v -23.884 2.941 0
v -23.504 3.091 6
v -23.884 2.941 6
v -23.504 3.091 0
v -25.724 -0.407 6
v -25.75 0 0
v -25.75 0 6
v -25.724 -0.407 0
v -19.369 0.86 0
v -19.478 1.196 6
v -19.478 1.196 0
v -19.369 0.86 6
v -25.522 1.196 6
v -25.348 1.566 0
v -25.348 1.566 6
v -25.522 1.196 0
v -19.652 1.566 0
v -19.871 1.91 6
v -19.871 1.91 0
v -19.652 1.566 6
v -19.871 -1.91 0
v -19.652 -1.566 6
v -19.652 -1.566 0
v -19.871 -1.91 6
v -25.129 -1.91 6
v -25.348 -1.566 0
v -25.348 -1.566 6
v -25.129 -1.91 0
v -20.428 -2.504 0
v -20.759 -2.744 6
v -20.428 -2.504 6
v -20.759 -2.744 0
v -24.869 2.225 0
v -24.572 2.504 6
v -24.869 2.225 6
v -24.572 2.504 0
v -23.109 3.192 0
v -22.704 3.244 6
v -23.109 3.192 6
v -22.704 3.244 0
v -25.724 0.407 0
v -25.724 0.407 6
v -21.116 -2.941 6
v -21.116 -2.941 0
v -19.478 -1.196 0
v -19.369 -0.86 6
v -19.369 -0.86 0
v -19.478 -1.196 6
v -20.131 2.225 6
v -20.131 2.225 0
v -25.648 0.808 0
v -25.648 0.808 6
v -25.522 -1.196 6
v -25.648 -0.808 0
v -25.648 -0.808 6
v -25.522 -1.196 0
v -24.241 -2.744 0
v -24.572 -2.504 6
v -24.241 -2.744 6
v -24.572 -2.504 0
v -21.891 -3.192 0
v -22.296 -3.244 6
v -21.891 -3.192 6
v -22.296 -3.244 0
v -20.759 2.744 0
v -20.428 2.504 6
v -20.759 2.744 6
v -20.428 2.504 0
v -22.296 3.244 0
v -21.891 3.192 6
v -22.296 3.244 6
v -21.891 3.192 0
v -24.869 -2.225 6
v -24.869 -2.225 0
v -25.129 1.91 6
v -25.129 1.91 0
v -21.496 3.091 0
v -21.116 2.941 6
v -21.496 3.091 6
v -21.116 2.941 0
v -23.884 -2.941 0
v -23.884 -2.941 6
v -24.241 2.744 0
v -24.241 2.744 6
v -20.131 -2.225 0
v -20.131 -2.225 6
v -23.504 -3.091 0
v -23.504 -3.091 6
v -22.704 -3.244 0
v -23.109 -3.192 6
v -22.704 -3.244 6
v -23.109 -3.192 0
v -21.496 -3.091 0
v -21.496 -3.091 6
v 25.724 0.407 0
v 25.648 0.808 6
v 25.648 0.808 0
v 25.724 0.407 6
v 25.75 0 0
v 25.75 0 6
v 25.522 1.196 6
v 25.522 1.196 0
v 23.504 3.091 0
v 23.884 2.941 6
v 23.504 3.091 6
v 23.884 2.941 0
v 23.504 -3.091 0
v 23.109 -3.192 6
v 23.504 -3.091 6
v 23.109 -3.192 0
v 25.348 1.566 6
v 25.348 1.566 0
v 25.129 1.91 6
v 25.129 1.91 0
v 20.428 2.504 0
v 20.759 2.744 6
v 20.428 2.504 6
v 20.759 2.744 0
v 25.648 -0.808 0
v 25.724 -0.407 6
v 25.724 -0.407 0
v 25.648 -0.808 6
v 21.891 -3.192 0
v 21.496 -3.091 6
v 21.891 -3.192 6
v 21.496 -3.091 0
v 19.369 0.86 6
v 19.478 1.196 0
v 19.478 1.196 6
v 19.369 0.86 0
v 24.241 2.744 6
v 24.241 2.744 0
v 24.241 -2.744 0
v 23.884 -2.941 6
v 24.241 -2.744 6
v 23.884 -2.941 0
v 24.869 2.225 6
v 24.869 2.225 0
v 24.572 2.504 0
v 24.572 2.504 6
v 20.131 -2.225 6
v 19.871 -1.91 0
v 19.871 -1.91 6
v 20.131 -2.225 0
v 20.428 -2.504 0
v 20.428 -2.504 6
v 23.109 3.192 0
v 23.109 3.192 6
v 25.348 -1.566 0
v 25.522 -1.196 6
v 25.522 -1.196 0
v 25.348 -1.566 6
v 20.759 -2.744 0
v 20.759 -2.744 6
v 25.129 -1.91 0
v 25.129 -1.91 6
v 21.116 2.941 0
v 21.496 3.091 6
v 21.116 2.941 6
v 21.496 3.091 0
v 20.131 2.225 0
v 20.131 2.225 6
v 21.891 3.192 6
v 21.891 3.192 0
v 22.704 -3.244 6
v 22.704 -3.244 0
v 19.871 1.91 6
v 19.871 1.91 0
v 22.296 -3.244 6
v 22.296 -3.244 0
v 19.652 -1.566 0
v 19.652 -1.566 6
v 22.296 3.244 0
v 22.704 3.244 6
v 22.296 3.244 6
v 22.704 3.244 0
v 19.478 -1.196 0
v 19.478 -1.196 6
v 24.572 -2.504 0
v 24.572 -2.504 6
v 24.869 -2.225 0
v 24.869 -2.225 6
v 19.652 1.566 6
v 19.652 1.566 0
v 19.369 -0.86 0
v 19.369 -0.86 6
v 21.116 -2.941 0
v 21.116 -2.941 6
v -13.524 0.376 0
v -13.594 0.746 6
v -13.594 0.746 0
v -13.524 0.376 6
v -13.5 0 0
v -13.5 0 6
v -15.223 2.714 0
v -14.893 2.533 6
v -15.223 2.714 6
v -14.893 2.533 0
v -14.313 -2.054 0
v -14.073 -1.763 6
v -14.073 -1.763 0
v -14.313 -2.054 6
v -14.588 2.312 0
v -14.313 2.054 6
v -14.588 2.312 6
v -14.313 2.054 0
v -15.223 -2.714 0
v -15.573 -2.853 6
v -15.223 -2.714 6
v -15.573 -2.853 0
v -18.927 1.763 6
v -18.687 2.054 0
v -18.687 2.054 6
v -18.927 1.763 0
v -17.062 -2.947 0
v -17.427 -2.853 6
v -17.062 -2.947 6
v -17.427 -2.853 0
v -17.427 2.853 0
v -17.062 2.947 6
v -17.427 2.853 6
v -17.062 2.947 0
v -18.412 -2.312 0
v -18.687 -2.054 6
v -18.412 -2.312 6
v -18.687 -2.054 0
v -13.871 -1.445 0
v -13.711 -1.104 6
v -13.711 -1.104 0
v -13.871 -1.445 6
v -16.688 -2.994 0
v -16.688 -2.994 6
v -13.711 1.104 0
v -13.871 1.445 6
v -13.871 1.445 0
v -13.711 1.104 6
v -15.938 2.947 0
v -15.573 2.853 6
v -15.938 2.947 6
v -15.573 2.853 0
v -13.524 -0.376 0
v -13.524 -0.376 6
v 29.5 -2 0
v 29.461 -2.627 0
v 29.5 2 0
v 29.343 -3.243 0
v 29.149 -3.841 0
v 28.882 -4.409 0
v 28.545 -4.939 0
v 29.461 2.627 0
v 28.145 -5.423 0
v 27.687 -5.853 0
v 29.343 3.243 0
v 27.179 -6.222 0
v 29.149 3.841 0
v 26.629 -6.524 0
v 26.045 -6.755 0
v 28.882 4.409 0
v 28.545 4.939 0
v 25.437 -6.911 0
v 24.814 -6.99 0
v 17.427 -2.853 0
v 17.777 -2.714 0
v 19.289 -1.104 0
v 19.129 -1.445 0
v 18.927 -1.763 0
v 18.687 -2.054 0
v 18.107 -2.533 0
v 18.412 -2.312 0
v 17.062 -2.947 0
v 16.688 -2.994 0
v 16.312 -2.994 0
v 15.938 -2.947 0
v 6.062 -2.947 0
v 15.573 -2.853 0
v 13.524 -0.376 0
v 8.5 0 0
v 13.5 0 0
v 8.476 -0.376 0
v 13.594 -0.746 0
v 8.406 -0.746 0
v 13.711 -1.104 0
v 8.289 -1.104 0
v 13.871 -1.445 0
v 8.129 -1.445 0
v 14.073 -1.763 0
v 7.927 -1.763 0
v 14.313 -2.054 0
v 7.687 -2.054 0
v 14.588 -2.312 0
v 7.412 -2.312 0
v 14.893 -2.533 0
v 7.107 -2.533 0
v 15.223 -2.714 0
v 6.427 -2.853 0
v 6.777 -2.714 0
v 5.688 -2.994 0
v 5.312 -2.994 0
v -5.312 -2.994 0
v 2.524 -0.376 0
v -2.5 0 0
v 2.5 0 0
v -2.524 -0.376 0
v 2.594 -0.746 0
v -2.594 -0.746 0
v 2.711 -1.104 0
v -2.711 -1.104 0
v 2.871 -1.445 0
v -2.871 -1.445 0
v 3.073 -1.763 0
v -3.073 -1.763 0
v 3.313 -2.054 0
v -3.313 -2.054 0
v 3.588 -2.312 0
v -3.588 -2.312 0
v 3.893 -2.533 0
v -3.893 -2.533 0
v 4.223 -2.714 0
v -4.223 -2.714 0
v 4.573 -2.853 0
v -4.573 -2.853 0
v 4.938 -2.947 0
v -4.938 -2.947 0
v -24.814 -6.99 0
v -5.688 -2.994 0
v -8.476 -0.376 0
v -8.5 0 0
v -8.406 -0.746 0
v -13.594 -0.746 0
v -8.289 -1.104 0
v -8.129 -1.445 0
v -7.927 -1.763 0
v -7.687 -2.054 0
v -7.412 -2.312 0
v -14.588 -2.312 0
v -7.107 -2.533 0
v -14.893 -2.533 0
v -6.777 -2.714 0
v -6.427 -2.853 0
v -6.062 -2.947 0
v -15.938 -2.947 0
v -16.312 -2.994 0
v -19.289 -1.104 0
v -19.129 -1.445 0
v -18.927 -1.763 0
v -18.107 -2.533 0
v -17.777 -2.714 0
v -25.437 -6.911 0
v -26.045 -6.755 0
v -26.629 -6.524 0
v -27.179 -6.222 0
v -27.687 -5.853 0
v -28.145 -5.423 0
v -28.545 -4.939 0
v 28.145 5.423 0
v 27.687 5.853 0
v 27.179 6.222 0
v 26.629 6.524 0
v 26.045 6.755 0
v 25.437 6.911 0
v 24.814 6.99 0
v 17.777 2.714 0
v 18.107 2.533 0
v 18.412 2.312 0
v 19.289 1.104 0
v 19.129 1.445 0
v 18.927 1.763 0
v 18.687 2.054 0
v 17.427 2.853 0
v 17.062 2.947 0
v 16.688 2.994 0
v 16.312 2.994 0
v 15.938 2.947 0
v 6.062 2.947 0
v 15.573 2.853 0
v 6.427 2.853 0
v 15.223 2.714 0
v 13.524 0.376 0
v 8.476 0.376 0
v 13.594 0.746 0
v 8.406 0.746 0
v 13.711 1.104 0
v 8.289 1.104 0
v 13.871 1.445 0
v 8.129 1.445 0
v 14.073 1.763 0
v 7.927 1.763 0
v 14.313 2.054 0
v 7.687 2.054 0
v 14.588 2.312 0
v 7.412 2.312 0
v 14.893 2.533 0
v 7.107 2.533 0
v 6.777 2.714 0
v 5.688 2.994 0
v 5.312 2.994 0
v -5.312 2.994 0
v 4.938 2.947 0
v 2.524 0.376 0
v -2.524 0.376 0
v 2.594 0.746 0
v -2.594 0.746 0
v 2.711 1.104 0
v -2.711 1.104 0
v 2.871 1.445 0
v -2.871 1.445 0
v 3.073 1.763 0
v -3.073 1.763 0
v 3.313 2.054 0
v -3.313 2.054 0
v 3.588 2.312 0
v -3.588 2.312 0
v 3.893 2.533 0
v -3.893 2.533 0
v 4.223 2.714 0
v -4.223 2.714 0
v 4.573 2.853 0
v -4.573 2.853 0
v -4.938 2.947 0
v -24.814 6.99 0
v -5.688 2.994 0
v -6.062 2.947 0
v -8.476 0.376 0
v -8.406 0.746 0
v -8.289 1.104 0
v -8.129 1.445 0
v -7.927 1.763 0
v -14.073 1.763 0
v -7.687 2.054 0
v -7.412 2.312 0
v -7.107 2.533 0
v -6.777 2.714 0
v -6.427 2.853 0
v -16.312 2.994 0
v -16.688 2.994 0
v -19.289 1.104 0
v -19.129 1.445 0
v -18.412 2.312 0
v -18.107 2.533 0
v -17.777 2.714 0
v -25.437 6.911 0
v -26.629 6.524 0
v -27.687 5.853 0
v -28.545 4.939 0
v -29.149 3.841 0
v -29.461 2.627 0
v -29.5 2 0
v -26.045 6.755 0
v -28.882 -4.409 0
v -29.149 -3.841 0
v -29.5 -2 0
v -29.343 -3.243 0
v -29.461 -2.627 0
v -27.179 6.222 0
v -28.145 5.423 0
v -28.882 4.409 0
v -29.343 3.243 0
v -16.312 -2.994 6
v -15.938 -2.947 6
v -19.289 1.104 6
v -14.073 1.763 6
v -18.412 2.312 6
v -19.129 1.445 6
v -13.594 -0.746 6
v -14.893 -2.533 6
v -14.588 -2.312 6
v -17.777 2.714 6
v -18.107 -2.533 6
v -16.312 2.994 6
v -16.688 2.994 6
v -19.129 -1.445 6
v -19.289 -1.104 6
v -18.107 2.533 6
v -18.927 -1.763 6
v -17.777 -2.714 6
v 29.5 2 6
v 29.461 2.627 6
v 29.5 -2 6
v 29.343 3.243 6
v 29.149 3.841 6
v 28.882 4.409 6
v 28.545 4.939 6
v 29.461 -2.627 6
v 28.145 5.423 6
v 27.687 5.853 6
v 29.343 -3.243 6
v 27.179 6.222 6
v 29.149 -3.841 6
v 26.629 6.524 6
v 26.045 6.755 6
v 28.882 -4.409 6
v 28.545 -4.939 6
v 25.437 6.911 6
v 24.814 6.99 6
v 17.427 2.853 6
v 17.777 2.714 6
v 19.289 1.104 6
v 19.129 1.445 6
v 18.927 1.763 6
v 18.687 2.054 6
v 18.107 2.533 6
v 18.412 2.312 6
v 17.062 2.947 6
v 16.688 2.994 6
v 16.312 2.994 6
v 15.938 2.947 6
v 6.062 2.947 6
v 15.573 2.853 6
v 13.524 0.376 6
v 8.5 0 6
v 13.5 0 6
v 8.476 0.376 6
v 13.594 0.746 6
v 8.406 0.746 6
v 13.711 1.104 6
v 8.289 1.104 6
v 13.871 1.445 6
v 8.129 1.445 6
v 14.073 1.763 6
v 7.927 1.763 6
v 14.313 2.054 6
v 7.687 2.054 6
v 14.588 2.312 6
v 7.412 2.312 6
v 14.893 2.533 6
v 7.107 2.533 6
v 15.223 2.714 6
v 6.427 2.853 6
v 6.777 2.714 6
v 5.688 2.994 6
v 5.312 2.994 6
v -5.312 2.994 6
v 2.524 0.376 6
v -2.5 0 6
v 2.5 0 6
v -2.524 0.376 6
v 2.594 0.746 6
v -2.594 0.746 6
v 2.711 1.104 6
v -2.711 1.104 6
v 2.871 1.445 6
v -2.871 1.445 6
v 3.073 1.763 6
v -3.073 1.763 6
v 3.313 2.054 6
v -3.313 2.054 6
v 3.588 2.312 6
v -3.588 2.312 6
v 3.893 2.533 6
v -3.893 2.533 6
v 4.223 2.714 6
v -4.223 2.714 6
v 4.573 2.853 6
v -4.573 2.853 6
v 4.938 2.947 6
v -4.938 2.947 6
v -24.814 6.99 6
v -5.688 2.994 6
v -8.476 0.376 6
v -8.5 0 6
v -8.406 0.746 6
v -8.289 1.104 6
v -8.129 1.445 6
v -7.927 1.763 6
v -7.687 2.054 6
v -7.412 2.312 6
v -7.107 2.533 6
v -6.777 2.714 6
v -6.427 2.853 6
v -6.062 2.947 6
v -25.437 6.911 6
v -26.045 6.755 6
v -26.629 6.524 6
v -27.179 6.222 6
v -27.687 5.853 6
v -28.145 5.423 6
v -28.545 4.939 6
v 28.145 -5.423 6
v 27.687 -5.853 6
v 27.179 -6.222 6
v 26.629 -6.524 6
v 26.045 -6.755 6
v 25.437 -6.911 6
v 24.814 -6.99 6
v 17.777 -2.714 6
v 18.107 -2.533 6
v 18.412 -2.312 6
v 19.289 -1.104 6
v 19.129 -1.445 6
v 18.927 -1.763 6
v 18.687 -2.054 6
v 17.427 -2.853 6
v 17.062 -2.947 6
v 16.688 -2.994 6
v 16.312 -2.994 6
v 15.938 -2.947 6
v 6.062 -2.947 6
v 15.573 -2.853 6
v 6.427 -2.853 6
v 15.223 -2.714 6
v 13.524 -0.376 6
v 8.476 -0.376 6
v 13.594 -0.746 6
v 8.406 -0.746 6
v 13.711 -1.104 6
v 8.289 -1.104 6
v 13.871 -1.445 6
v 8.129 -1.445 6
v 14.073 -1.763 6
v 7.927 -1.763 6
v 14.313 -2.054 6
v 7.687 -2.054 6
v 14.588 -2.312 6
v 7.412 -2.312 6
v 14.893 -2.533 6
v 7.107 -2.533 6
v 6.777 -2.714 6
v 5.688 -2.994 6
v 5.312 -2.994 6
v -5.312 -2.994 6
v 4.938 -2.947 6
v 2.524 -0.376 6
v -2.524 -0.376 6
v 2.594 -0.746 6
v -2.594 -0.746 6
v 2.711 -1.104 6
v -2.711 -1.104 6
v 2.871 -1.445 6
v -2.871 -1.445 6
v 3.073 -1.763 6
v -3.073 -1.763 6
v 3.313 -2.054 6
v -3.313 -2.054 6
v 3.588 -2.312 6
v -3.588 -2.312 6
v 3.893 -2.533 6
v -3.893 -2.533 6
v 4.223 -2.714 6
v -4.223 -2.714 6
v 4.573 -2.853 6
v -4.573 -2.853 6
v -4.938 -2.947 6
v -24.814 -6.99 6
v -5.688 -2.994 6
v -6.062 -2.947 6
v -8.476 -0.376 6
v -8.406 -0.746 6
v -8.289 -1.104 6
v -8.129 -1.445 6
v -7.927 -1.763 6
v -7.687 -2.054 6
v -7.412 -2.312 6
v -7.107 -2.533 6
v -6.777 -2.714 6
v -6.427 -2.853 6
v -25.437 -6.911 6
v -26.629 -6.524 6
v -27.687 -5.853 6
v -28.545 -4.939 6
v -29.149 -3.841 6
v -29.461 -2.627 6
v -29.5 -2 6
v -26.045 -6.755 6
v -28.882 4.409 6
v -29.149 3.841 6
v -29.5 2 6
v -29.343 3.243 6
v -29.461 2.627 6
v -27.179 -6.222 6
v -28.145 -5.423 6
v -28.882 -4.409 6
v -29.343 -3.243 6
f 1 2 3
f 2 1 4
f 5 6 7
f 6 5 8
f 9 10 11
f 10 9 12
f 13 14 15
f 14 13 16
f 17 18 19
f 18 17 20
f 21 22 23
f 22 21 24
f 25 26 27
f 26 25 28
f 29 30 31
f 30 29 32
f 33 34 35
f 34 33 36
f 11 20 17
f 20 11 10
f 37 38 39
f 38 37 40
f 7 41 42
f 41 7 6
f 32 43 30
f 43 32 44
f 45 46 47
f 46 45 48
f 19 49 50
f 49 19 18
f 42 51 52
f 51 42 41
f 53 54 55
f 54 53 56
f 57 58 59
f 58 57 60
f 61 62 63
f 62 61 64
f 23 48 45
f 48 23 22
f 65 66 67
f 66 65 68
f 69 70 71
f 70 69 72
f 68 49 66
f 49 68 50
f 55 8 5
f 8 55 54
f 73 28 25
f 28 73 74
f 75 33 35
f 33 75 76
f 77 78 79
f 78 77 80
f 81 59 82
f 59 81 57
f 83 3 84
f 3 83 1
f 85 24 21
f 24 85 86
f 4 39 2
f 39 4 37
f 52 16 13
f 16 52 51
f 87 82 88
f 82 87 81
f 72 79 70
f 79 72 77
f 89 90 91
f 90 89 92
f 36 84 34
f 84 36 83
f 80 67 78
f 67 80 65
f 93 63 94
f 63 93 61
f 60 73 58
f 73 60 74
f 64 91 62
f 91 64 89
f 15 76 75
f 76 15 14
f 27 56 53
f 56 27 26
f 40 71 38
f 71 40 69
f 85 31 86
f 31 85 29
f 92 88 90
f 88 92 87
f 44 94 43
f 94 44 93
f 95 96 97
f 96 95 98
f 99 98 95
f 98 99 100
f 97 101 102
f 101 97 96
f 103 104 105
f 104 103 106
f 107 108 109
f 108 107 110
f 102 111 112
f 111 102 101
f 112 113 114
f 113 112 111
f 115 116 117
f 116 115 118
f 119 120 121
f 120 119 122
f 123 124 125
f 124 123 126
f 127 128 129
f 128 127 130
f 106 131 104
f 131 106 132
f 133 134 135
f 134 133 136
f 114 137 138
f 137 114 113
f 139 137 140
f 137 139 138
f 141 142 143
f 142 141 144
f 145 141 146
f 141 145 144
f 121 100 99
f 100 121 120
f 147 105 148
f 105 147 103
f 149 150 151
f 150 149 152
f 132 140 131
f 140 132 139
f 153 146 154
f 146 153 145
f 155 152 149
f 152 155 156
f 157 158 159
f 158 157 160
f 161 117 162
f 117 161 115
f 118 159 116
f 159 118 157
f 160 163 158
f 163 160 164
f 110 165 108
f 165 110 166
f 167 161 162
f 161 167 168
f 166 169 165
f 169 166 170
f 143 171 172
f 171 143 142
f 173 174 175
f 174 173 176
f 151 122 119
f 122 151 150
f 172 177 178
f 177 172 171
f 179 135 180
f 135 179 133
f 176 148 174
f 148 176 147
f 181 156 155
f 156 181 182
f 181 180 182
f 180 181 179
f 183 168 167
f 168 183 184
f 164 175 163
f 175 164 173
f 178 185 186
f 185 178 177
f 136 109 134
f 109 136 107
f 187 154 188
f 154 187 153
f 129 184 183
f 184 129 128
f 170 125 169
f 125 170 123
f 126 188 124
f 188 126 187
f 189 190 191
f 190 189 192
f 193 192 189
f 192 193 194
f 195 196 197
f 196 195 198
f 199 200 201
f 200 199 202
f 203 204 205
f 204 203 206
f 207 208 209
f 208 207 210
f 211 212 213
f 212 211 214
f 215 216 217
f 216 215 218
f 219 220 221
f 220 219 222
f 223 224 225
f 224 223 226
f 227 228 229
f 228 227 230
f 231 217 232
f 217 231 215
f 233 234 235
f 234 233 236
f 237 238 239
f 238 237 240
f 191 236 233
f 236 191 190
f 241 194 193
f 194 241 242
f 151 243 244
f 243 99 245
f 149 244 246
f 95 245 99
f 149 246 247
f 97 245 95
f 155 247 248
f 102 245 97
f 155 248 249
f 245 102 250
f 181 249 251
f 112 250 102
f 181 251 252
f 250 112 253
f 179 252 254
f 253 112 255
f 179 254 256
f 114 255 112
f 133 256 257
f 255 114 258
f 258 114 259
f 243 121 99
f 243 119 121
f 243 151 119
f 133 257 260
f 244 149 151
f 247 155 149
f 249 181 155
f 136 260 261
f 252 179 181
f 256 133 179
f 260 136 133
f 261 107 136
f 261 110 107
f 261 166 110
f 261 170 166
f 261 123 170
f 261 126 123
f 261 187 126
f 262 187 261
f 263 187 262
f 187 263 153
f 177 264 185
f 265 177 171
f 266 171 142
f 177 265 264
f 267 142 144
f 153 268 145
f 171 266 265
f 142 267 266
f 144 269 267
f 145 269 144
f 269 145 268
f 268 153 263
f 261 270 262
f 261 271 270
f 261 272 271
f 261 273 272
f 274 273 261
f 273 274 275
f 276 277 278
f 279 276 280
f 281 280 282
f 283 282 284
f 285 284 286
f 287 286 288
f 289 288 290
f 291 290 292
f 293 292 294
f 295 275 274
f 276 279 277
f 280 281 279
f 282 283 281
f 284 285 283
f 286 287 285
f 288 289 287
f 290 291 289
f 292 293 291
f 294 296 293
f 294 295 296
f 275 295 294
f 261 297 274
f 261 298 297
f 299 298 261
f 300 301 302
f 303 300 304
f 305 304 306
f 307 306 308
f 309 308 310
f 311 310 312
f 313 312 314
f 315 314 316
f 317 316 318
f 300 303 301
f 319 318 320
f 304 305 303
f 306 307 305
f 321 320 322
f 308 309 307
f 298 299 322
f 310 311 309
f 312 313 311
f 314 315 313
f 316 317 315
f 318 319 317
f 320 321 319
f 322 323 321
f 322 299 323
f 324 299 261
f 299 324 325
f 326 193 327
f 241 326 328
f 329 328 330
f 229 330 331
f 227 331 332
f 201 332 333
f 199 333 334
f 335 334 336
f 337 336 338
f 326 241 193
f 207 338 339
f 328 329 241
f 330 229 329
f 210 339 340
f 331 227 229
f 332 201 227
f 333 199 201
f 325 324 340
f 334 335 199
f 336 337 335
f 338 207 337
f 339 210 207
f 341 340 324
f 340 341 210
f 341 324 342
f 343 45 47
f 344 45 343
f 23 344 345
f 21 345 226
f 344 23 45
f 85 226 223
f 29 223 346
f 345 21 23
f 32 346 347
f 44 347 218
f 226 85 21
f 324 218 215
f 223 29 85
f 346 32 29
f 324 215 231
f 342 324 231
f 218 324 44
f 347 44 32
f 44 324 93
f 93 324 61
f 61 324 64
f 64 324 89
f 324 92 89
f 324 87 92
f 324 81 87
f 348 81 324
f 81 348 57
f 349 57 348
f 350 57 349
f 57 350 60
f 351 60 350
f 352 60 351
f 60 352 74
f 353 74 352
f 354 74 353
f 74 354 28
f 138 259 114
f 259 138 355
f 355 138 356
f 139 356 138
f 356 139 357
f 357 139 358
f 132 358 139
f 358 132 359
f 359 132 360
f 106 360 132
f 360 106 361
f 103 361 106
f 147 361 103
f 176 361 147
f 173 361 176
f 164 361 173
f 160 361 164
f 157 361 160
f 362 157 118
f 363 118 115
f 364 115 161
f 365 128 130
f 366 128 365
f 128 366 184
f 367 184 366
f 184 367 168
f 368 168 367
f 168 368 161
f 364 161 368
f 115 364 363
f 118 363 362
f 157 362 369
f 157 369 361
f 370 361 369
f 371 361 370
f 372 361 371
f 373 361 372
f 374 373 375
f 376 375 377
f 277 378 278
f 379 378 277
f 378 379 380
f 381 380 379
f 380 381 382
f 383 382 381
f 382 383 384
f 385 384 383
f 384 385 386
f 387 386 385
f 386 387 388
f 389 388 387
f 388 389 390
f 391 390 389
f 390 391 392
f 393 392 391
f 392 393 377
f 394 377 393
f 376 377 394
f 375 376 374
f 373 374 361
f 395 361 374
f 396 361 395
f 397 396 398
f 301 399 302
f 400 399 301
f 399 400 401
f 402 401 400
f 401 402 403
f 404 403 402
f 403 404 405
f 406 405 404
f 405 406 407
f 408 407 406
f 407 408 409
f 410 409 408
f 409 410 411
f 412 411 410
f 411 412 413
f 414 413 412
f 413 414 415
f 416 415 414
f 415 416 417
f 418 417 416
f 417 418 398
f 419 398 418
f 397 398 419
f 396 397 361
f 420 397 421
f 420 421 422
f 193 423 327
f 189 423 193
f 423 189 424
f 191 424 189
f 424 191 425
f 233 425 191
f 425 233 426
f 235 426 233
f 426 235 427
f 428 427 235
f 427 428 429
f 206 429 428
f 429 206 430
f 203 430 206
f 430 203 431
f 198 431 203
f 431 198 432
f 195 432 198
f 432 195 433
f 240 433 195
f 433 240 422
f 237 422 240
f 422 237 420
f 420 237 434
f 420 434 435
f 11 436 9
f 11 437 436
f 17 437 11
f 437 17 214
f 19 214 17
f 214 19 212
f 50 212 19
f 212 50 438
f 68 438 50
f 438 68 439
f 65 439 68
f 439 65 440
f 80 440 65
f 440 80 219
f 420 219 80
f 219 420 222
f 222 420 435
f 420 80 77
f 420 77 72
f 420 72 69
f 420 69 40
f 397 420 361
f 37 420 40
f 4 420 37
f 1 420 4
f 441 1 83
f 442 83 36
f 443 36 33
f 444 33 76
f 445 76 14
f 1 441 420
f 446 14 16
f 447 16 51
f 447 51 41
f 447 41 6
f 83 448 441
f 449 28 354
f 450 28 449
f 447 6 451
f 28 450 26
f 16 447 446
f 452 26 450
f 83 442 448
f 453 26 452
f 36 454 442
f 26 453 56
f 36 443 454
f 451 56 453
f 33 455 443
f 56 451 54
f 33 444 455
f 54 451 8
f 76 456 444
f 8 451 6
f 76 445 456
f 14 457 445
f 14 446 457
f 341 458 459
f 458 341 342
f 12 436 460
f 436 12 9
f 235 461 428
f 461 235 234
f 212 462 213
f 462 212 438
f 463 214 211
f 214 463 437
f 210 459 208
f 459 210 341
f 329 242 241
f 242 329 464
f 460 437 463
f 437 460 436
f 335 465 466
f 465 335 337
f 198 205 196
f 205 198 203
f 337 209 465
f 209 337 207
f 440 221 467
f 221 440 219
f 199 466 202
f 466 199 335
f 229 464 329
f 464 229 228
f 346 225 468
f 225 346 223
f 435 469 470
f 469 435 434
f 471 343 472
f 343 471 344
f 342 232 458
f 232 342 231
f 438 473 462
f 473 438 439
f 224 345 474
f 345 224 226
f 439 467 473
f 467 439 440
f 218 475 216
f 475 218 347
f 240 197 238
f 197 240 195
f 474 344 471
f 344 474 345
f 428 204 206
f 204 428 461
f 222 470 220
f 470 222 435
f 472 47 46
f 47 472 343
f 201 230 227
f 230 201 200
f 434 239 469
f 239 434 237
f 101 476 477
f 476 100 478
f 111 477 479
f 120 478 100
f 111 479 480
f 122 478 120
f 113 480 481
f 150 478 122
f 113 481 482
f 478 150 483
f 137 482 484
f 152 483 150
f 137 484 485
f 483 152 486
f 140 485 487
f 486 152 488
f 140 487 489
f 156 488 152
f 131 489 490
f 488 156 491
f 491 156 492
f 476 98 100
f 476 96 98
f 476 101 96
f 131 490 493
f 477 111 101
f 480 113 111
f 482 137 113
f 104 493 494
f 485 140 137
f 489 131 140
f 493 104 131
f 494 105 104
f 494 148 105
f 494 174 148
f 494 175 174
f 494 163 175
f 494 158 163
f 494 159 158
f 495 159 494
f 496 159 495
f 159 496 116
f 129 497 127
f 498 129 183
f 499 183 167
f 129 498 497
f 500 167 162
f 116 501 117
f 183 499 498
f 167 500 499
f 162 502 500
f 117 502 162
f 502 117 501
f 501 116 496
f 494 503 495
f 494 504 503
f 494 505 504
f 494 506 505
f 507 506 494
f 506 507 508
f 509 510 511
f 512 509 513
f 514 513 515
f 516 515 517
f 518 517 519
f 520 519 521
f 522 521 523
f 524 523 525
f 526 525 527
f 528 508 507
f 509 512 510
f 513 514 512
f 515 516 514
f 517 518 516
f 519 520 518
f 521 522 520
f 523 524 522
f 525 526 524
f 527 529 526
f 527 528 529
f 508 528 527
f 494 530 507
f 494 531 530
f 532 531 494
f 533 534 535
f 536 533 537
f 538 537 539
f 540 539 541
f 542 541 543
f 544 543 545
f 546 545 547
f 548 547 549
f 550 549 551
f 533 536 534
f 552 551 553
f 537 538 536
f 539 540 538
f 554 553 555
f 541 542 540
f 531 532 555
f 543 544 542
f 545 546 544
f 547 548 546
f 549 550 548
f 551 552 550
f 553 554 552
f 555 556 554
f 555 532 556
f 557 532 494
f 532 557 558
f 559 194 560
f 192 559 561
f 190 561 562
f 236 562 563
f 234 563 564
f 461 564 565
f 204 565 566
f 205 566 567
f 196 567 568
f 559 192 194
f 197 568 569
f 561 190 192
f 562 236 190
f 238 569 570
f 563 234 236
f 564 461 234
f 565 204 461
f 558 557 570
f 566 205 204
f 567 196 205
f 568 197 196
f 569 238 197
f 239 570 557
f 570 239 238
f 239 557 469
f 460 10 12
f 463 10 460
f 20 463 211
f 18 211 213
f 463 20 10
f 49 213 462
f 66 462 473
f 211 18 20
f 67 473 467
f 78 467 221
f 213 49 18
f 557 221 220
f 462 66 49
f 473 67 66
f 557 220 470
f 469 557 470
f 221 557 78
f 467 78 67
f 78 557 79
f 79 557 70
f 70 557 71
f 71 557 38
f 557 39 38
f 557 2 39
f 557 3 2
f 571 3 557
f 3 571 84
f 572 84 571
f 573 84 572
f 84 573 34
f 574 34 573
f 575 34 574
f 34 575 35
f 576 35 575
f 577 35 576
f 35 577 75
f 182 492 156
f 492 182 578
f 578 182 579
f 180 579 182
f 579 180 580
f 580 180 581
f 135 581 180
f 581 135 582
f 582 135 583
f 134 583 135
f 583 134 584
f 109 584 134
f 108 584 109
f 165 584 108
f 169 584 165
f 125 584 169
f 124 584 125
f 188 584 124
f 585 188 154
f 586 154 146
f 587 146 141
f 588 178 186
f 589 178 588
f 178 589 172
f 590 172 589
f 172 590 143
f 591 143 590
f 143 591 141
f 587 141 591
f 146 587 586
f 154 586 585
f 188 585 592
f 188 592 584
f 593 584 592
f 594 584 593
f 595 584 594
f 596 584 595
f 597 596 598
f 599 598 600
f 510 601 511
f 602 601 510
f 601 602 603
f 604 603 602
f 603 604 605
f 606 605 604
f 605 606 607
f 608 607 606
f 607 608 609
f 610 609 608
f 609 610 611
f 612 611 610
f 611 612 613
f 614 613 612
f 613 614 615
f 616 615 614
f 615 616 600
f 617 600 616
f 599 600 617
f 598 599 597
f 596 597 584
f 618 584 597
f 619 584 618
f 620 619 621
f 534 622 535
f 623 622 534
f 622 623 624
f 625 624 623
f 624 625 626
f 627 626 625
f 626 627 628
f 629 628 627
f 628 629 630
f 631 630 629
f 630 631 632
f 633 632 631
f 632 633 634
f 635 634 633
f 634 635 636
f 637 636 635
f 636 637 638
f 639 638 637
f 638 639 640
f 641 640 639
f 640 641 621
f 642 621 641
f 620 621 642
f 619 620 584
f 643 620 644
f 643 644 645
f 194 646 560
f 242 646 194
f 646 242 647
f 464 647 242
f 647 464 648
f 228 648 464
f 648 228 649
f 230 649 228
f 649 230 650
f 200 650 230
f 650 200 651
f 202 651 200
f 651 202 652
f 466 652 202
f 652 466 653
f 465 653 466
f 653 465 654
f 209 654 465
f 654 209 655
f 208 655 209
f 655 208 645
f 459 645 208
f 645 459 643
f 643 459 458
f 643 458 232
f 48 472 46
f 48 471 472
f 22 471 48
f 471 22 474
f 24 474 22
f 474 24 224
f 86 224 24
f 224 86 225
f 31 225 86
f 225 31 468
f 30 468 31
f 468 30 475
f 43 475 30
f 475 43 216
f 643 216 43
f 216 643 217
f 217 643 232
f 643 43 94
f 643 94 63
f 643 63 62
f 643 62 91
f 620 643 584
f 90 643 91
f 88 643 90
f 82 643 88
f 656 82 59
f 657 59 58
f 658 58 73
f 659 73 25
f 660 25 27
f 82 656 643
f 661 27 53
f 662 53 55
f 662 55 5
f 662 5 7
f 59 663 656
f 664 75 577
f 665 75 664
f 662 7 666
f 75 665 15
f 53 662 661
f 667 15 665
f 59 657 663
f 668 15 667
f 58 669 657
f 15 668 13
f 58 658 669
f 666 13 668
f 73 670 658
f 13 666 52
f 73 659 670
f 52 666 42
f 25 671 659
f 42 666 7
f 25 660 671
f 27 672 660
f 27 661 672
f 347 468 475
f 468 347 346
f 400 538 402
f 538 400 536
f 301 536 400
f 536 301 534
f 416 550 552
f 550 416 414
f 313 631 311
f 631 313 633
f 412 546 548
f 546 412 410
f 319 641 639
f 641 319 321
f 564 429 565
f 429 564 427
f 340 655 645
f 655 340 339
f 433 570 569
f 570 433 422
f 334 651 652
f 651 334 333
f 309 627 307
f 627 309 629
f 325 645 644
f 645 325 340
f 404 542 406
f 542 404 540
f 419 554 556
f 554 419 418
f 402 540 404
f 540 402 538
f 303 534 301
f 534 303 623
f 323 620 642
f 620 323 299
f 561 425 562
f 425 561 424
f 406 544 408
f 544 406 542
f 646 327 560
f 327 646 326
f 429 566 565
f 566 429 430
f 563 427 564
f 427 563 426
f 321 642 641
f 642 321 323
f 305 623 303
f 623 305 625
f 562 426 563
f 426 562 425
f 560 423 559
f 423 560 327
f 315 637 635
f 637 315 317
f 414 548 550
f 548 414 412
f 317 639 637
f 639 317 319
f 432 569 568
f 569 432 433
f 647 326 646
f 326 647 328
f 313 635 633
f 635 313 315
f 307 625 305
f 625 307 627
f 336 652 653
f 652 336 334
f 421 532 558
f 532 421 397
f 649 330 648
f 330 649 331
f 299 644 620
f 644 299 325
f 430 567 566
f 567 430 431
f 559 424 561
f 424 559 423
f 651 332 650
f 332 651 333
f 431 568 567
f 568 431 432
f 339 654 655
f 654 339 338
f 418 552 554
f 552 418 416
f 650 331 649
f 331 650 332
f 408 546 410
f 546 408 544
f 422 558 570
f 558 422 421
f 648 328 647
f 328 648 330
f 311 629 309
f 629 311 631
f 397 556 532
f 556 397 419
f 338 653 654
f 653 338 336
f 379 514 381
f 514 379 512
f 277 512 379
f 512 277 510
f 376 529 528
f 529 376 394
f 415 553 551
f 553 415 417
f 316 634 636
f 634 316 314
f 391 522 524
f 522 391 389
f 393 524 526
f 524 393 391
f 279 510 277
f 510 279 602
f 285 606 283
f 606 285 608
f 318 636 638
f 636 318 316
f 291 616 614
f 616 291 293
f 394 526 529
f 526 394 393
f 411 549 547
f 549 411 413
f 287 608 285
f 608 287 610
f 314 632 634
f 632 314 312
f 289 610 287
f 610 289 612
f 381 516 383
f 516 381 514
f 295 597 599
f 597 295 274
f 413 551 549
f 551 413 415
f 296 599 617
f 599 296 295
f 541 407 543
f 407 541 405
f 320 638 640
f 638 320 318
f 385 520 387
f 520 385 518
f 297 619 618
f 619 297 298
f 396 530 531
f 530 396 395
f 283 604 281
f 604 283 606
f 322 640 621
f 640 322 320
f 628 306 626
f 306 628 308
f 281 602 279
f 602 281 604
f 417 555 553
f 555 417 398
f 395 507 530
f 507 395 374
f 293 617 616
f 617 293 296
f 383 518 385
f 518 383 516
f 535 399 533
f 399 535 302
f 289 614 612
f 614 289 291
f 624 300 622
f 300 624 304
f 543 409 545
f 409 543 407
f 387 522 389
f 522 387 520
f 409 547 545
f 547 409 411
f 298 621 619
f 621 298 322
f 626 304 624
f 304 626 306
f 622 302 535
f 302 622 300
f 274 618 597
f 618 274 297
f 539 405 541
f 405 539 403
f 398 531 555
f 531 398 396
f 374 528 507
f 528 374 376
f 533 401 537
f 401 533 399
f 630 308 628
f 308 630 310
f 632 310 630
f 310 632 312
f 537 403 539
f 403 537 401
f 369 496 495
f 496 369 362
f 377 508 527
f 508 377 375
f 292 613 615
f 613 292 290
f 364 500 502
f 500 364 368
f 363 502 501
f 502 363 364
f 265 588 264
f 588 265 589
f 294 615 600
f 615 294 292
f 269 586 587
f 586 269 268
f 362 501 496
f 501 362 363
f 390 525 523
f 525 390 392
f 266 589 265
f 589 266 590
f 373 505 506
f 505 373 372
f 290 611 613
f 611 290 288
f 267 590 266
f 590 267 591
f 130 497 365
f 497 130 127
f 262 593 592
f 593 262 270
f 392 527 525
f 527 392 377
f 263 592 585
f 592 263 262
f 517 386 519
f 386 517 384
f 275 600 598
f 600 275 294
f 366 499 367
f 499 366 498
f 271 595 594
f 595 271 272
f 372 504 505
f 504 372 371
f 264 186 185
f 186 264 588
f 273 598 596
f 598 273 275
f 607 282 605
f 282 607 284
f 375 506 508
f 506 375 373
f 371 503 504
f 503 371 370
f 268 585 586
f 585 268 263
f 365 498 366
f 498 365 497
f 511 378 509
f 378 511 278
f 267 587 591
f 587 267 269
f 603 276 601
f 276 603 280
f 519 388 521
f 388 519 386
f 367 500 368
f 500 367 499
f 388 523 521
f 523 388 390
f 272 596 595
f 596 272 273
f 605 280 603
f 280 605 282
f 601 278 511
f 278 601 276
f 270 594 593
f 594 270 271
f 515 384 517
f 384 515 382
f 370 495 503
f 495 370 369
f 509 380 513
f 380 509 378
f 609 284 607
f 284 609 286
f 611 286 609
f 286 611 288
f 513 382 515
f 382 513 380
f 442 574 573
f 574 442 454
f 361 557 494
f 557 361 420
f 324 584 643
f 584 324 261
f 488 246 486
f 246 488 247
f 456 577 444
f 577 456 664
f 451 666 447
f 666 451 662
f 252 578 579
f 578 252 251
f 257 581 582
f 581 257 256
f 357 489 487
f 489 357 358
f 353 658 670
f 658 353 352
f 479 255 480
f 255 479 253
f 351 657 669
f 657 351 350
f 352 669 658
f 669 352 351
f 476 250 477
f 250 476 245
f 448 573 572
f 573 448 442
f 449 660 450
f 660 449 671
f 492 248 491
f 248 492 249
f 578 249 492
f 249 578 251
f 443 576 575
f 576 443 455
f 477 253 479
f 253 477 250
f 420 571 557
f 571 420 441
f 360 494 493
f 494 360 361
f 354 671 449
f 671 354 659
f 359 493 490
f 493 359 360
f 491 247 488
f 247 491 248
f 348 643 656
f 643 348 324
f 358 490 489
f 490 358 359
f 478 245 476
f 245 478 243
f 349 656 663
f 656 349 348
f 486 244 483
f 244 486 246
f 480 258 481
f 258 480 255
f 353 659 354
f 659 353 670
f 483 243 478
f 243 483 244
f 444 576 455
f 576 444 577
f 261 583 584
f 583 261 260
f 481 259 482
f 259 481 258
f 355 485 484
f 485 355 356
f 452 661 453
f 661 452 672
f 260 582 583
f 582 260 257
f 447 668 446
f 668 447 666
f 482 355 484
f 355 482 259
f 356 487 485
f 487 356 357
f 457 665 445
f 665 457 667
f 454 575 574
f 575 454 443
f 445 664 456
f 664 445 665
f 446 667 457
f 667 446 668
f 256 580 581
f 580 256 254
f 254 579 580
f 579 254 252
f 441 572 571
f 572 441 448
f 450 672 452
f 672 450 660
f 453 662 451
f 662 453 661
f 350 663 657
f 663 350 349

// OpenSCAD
$fn = 50;

difference() {
	union() {
		hull() {
			translate(v = [-24.5, 2.0, 0]) {
				cylinder(h = 6, r = 5);
			}
			translate(v = [24.5, 2.0, 0]) {
				cylinder(h = 6, r = 5);
			}
			translate(v = [-24.5, -2.0, 0]) {
				cylinder(h = 6, r = 5);
			}
			translate(v = [24.5, -2.0, 0]) {
				cylinder(h = 6, r = 5);
			}
		}
	}
	union() {
		translate(v = [-22.5, 0.0, -100.0]) {
			cylinder(h = 200, r = 3.25);
		}
		translate(v = [22.5, 0.0, -100.0]) {
			cylinder(h = 200, r = 3.25);
		}
		translate(v = [-22.5, 0.0, -100.0]) {
			cylinder(h = 200, r = 1.8);
		}
		translate(v = [22.5, 0.0, -100.0]) {
			cylinder(h = 200, r = 1.8);
		}
		translate(v = [-16.5, 0, 0.0]) {
			cylinder(h = 6, r = 3.0);
		}
		translate(v = [-5.5, 0, 0.0]) {
			cylinder(h = 6, r = 3.0);
		}
		translate(v = [5.5, 0, 0.0]) {
			cylinder(h = 6, r = 3.0);
		}
		translate(v = [16.5, 0, 0.0]) {
			cylinder(h = 6, r = 3.0);
		}
	}
}
